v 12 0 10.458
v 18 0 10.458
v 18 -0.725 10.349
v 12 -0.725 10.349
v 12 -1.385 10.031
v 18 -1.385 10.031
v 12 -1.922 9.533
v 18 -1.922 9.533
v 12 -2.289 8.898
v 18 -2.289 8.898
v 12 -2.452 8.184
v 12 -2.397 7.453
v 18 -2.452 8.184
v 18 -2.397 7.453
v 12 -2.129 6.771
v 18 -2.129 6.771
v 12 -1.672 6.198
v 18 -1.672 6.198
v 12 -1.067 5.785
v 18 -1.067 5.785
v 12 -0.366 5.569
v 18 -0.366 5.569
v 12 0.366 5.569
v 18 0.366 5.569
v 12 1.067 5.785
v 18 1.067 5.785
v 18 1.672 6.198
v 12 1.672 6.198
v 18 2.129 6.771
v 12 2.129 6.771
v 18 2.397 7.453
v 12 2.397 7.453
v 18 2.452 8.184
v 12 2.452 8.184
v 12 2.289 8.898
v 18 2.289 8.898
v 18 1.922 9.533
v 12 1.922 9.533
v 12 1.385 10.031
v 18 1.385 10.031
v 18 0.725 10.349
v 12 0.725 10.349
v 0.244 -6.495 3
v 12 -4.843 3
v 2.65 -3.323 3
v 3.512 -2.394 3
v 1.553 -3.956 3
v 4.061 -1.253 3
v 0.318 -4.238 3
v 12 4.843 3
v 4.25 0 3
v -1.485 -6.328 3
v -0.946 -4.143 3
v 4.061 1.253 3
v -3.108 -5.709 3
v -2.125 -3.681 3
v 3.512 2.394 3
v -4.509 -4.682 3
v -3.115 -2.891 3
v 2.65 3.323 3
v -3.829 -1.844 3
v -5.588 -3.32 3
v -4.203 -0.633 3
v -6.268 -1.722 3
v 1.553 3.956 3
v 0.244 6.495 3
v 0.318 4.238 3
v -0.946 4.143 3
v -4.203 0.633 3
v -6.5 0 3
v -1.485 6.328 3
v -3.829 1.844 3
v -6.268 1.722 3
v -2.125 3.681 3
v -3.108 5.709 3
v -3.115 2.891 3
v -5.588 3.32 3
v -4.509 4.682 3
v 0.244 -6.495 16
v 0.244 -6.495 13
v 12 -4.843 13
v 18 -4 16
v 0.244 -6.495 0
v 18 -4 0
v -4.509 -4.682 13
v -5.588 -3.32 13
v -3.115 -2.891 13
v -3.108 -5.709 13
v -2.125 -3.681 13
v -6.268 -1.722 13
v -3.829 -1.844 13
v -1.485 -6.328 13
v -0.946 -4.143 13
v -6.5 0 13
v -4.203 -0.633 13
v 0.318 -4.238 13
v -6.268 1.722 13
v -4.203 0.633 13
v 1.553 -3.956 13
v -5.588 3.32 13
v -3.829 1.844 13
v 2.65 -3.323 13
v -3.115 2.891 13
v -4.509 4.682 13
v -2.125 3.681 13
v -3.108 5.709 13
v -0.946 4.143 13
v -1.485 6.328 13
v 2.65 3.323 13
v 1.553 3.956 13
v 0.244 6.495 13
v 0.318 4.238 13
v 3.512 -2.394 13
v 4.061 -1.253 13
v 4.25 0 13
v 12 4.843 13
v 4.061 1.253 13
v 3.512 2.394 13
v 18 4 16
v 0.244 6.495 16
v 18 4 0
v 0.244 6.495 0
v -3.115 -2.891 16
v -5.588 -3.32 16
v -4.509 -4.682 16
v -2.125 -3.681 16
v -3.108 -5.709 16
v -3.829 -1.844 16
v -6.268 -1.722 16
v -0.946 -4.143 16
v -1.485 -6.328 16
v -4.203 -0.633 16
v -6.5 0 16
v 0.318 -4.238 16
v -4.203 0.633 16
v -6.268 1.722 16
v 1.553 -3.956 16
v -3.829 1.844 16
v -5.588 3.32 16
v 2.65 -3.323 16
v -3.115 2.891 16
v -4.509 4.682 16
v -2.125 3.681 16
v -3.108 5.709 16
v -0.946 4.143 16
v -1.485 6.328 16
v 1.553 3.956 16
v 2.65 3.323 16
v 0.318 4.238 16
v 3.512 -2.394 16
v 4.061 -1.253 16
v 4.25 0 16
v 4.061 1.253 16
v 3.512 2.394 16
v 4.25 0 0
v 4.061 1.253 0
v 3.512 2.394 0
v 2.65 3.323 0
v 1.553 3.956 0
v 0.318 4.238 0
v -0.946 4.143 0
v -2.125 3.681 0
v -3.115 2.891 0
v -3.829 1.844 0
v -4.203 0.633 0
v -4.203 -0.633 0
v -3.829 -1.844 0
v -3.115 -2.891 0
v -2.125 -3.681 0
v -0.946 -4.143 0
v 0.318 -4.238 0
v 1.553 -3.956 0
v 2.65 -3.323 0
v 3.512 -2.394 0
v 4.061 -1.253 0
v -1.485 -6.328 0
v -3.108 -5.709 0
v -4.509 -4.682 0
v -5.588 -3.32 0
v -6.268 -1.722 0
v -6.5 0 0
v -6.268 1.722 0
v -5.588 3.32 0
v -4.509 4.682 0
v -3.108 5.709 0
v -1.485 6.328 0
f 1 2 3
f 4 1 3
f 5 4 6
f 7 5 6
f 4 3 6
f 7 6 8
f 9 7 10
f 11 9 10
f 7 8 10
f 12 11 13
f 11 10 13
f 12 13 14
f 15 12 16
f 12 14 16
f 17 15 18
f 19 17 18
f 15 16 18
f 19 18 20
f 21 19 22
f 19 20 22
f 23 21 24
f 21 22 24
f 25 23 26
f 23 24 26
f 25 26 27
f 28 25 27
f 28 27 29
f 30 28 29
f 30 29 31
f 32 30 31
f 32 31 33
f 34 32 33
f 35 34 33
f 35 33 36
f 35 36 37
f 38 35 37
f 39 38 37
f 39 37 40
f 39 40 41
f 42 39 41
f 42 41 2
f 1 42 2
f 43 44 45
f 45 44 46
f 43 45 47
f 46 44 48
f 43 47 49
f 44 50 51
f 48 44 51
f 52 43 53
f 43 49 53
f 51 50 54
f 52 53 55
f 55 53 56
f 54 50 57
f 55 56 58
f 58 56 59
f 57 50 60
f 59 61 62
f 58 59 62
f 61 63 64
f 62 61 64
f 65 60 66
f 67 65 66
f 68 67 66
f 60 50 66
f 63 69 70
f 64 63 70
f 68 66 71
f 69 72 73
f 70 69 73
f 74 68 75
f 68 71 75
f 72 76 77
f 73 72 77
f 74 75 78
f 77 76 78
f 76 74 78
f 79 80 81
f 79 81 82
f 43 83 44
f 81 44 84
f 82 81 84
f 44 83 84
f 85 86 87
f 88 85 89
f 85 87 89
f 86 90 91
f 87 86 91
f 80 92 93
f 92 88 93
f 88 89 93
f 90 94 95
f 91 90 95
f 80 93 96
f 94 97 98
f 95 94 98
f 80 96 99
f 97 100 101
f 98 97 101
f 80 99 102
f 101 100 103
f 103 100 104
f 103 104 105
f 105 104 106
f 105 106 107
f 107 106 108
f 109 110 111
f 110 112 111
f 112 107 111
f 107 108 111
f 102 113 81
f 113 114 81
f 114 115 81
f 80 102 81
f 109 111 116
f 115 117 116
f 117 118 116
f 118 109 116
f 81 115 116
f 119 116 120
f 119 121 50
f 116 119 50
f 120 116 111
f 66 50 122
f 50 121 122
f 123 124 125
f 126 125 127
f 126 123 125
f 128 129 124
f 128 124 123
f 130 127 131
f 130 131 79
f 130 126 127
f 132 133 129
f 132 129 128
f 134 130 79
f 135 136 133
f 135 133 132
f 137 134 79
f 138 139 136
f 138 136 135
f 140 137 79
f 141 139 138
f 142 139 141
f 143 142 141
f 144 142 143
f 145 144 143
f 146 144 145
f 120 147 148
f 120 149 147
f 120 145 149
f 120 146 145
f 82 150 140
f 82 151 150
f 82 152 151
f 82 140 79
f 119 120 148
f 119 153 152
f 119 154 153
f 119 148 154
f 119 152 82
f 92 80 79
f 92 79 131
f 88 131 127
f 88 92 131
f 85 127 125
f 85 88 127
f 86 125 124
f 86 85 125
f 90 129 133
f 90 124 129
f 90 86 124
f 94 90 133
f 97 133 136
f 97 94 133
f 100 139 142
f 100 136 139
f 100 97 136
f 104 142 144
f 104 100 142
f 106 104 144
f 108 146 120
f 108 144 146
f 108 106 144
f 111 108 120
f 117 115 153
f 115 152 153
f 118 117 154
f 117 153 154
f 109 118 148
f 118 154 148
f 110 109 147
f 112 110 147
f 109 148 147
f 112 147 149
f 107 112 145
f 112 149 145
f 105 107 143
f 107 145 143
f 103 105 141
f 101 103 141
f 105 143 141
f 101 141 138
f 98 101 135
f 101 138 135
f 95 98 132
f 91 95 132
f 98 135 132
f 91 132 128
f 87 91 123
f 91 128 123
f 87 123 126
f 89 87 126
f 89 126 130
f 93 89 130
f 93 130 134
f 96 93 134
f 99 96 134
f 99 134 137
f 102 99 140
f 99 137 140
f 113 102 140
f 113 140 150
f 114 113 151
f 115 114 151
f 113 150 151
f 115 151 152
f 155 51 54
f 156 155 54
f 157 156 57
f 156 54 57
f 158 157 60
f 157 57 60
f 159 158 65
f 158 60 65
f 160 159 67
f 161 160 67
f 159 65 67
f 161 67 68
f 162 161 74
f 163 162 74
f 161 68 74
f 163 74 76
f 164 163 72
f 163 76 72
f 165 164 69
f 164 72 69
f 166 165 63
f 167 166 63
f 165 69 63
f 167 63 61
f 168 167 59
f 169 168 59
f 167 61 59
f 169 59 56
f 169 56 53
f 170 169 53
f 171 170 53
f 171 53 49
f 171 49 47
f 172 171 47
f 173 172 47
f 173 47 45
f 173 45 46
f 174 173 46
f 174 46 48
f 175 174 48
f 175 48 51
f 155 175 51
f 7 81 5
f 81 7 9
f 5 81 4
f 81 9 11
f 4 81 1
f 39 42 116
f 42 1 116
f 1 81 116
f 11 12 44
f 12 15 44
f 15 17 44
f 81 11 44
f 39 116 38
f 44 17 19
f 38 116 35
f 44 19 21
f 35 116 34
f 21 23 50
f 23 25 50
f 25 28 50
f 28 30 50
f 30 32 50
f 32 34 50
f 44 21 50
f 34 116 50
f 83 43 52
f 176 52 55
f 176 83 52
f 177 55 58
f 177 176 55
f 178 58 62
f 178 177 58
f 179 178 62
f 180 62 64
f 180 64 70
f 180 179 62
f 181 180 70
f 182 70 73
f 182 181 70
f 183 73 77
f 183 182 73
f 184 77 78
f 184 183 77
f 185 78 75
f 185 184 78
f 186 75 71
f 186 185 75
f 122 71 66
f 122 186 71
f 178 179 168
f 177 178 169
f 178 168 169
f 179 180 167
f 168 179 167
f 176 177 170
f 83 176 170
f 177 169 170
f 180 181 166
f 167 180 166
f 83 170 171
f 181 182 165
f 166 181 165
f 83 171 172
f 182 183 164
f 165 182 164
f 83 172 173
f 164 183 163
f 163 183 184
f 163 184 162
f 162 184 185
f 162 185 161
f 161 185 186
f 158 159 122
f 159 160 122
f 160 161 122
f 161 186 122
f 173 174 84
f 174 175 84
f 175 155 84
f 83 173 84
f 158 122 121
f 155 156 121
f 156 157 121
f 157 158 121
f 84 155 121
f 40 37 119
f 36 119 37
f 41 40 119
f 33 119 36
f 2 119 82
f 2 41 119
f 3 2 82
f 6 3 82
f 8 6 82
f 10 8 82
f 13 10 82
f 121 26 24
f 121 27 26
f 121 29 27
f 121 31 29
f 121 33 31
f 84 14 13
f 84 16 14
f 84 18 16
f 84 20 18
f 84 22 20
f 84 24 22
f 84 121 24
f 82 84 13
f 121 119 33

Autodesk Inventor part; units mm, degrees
ref_plane "YZ Plane" through (0, 0, 0) normal (1, 0, 0) x (0, 1, 0)
ref_plane "XY Plane" through (0, 0, 0) normal (0, 0, 1) x (1, 0, 0)
sketch "Sketch1" plane through (0, 0, 0) normal (0, 0, 1) x (1, 0, 0)
  arc A0 (0.2442, 6.4954) -> (0.2442, -6.4954) centre (0, 0) ccw
  line L0 (18, 4) -> (18, -4)
  line L1 (18, 4) -> (0.2442, 6.4954)
  line L2 (0.2442, -6.4954) -> (18, -4)
  point P0 (18, 0)
  dimension "d0" = 13
  dimension "d1" = 8
  dimension "d2" = 18
  dimension "d3" = 82
  dimension "d4" = 82
extrude "Extrusion1" add sketch "Sketch1" along normal blind 16
sketch "Sketch2" plane through (0, 0, 16) normal (0, 0, 1) x (1, 0, 0)
  arc A0 (0.2442, 6.4954) -> (0.2442, -6.4954) centre (0, 0) ccw projected
  circle A1 centre (0, 0) radius 4.25
  dimension "d7" = 8.5
extrude "Extrusion2" cut sketch "Sketch2" against normal through all
ref_plane "Work Plane1" through (0, 6.5, 0) normal (0, 1, 0) x (-1, 0, 0)
sketch "Sketch3" plane through (0, 6.5, 0) normal (0, 1, 0) x (-1, 0, 0)
  line L0 (6.5, 0) -> (6.5, 16) projected
  line L1 (6.5, 13) -> (-12, 13)
  line L2 (-12, 13) -> (-12, 3)
  line L3 (-12, 3) -> (6.5, 3)
  line L4 (6.5, 3) -> (6.5, 13)
  line L5 (-18, 0) -> (-18, 16) projected
  line L6 (6.5, 0) -> (-0.2442, 0) projected
  line L7 (6.5, 16) -> (-0.2442, 16) projected
  point P0 (0, 0)
  point P1 (6.5, 3)
  dimension "d11" = 6
  dimension "d12" = 3
  dimension "d13" = 3
extrude "Extrusion3" cut sketch "Sketch3" against normal through all
sketch "Sketch4" plane through (12, -4.8432, 3) normal (-1, 0, 0) x (0, 0, 1)
  line L0 (10, 9.6865) -> (10, 0) projected
  circle A0 centre (5, 4.8432) radius 2.5
  line L1 (-3, 8.8432) -> (13, 8.8432) projected
  point P0 (-3, 4.8432)
  dimension "d16" = 5
  dimension "d17" = 4
  dimension "d18" = 5
hole "Hole1" at (12, 0, 8) direction (1, 0, 0) diameter 4.917 depth 6 thread size "M6x1" class "6H" standard "ANSI Metric M Profile"
properties part number "16C - Con Head Crosshead" material "Steel AISI 1020 107 HR"
